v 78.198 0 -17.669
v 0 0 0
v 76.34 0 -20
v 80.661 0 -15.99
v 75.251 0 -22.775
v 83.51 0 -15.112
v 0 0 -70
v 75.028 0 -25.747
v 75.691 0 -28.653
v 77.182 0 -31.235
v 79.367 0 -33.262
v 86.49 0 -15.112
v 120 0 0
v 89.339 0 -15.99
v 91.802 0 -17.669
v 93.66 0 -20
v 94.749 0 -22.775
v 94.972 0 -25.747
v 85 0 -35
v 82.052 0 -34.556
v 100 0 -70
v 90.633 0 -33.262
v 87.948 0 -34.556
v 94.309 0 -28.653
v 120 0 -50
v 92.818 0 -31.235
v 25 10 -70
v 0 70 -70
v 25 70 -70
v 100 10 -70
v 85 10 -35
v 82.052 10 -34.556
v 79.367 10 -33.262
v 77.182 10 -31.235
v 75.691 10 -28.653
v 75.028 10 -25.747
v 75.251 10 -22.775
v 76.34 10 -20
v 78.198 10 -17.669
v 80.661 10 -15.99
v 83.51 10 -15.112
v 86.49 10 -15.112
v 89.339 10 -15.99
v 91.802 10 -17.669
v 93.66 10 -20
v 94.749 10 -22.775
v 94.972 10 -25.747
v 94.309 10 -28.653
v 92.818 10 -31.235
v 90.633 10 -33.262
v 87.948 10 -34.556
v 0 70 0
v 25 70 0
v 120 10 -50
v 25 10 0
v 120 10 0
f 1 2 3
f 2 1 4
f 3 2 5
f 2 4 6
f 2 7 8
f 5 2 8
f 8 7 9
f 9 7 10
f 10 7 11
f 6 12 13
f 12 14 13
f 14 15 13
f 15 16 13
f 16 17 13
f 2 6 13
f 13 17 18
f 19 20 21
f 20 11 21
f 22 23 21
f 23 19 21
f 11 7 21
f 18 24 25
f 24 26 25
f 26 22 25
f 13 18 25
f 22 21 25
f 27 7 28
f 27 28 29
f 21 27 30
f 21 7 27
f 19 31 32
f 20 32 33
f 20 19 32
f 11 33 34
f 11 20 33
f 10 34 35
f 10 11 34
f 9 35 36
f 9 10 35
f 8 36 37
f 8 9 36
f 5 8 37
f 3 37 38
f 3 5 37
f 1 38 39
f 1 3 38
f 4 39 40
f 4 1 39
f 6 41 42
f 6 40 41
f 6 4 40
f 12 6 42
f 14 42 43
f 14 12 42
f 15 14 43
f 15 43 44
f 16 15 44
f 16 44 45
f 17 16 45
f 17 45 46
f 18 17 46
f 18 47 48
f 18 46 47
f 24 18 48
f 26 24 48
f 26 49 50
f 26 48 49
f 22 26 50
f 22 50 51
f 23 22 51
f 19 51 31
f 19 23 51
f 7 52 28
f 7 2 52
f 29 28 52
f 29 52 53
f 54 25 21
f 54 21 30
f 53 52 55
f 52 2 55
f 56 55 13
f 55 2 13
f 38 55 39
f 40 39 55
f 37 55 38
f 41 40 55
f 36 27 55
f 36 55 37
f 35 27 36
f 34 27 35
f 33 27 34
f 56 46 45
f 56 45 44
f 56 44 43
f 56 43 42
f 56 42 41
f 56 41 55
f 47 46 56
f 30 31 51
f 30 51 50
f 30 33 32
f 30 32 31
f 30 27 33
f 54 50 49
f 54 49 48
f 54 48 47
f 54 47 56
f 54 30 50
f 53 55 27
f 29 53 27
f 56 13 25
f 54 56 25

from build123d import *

# Parameters (mm, degrees)
SKETCH1_W           = 120
SKETCH1_H           = 70
BOSS_EXTRUDE1_DEPTH = 10
SKETCH2_W           = 25
SKETCH2_H           = 70
BOSS_EXTRUDE2_DEPTH = 60
SKETCH3_R           = 10
CUT_EXTRUDE1_DEPTH  = 156.563491861
CHAMFER1_SIZE       = 20


with BuildPart() as part:
    # Sketch1 → Boss-Extrude1 (new body)
    with BuildSketch(Plane(origin=(0, 0, 0), x_dir=(1, 0, 0), z_dir=(0, 1, 0))):
        with Locations((60, 35)):
            Rectangle(SKETCH1_W, SKETCH1_H)
    extrude(amount=BOSS_EXTRUDE1_DEPTH)

    # Sketch2 → Boss-Extrude2 (add)
    with BuildSketch(Plane(origin=(0, 10, 0), x_dir=(1, 0, 0), z_dir=(0, 1, 0))):
        with Locations((12.5, 35)):
            Rectangle(SKETCH2_W, SKETCH2_H)
    extrude(amount=BOSS_EXTRUDE2_DEPTH)

    # Sketch3 → Cut-Extrude1 (cut, through all)
    with BuildSketch(Plane(origin=(0, 0, 0), x_dir=(1, 0, 0), z_dir=(0, 1, 0))):
        with Locations(Location((85, 25, 0), (0, 0, 90))):
            Circle(SKETCH3_R)
    extrude(amount=CUT_EXTRUDE1_DEPTH, mode=Mode.SUBTRACT)

    # Chamfer1
    chamfer1_edges = [part.edges().sort_by_distance(p)[0] for p in [
        (120, 5, -70),
    ]]
    chamfer(chamfer1_edges, length=CHAMFER1_SIZE)


solid = part.part
